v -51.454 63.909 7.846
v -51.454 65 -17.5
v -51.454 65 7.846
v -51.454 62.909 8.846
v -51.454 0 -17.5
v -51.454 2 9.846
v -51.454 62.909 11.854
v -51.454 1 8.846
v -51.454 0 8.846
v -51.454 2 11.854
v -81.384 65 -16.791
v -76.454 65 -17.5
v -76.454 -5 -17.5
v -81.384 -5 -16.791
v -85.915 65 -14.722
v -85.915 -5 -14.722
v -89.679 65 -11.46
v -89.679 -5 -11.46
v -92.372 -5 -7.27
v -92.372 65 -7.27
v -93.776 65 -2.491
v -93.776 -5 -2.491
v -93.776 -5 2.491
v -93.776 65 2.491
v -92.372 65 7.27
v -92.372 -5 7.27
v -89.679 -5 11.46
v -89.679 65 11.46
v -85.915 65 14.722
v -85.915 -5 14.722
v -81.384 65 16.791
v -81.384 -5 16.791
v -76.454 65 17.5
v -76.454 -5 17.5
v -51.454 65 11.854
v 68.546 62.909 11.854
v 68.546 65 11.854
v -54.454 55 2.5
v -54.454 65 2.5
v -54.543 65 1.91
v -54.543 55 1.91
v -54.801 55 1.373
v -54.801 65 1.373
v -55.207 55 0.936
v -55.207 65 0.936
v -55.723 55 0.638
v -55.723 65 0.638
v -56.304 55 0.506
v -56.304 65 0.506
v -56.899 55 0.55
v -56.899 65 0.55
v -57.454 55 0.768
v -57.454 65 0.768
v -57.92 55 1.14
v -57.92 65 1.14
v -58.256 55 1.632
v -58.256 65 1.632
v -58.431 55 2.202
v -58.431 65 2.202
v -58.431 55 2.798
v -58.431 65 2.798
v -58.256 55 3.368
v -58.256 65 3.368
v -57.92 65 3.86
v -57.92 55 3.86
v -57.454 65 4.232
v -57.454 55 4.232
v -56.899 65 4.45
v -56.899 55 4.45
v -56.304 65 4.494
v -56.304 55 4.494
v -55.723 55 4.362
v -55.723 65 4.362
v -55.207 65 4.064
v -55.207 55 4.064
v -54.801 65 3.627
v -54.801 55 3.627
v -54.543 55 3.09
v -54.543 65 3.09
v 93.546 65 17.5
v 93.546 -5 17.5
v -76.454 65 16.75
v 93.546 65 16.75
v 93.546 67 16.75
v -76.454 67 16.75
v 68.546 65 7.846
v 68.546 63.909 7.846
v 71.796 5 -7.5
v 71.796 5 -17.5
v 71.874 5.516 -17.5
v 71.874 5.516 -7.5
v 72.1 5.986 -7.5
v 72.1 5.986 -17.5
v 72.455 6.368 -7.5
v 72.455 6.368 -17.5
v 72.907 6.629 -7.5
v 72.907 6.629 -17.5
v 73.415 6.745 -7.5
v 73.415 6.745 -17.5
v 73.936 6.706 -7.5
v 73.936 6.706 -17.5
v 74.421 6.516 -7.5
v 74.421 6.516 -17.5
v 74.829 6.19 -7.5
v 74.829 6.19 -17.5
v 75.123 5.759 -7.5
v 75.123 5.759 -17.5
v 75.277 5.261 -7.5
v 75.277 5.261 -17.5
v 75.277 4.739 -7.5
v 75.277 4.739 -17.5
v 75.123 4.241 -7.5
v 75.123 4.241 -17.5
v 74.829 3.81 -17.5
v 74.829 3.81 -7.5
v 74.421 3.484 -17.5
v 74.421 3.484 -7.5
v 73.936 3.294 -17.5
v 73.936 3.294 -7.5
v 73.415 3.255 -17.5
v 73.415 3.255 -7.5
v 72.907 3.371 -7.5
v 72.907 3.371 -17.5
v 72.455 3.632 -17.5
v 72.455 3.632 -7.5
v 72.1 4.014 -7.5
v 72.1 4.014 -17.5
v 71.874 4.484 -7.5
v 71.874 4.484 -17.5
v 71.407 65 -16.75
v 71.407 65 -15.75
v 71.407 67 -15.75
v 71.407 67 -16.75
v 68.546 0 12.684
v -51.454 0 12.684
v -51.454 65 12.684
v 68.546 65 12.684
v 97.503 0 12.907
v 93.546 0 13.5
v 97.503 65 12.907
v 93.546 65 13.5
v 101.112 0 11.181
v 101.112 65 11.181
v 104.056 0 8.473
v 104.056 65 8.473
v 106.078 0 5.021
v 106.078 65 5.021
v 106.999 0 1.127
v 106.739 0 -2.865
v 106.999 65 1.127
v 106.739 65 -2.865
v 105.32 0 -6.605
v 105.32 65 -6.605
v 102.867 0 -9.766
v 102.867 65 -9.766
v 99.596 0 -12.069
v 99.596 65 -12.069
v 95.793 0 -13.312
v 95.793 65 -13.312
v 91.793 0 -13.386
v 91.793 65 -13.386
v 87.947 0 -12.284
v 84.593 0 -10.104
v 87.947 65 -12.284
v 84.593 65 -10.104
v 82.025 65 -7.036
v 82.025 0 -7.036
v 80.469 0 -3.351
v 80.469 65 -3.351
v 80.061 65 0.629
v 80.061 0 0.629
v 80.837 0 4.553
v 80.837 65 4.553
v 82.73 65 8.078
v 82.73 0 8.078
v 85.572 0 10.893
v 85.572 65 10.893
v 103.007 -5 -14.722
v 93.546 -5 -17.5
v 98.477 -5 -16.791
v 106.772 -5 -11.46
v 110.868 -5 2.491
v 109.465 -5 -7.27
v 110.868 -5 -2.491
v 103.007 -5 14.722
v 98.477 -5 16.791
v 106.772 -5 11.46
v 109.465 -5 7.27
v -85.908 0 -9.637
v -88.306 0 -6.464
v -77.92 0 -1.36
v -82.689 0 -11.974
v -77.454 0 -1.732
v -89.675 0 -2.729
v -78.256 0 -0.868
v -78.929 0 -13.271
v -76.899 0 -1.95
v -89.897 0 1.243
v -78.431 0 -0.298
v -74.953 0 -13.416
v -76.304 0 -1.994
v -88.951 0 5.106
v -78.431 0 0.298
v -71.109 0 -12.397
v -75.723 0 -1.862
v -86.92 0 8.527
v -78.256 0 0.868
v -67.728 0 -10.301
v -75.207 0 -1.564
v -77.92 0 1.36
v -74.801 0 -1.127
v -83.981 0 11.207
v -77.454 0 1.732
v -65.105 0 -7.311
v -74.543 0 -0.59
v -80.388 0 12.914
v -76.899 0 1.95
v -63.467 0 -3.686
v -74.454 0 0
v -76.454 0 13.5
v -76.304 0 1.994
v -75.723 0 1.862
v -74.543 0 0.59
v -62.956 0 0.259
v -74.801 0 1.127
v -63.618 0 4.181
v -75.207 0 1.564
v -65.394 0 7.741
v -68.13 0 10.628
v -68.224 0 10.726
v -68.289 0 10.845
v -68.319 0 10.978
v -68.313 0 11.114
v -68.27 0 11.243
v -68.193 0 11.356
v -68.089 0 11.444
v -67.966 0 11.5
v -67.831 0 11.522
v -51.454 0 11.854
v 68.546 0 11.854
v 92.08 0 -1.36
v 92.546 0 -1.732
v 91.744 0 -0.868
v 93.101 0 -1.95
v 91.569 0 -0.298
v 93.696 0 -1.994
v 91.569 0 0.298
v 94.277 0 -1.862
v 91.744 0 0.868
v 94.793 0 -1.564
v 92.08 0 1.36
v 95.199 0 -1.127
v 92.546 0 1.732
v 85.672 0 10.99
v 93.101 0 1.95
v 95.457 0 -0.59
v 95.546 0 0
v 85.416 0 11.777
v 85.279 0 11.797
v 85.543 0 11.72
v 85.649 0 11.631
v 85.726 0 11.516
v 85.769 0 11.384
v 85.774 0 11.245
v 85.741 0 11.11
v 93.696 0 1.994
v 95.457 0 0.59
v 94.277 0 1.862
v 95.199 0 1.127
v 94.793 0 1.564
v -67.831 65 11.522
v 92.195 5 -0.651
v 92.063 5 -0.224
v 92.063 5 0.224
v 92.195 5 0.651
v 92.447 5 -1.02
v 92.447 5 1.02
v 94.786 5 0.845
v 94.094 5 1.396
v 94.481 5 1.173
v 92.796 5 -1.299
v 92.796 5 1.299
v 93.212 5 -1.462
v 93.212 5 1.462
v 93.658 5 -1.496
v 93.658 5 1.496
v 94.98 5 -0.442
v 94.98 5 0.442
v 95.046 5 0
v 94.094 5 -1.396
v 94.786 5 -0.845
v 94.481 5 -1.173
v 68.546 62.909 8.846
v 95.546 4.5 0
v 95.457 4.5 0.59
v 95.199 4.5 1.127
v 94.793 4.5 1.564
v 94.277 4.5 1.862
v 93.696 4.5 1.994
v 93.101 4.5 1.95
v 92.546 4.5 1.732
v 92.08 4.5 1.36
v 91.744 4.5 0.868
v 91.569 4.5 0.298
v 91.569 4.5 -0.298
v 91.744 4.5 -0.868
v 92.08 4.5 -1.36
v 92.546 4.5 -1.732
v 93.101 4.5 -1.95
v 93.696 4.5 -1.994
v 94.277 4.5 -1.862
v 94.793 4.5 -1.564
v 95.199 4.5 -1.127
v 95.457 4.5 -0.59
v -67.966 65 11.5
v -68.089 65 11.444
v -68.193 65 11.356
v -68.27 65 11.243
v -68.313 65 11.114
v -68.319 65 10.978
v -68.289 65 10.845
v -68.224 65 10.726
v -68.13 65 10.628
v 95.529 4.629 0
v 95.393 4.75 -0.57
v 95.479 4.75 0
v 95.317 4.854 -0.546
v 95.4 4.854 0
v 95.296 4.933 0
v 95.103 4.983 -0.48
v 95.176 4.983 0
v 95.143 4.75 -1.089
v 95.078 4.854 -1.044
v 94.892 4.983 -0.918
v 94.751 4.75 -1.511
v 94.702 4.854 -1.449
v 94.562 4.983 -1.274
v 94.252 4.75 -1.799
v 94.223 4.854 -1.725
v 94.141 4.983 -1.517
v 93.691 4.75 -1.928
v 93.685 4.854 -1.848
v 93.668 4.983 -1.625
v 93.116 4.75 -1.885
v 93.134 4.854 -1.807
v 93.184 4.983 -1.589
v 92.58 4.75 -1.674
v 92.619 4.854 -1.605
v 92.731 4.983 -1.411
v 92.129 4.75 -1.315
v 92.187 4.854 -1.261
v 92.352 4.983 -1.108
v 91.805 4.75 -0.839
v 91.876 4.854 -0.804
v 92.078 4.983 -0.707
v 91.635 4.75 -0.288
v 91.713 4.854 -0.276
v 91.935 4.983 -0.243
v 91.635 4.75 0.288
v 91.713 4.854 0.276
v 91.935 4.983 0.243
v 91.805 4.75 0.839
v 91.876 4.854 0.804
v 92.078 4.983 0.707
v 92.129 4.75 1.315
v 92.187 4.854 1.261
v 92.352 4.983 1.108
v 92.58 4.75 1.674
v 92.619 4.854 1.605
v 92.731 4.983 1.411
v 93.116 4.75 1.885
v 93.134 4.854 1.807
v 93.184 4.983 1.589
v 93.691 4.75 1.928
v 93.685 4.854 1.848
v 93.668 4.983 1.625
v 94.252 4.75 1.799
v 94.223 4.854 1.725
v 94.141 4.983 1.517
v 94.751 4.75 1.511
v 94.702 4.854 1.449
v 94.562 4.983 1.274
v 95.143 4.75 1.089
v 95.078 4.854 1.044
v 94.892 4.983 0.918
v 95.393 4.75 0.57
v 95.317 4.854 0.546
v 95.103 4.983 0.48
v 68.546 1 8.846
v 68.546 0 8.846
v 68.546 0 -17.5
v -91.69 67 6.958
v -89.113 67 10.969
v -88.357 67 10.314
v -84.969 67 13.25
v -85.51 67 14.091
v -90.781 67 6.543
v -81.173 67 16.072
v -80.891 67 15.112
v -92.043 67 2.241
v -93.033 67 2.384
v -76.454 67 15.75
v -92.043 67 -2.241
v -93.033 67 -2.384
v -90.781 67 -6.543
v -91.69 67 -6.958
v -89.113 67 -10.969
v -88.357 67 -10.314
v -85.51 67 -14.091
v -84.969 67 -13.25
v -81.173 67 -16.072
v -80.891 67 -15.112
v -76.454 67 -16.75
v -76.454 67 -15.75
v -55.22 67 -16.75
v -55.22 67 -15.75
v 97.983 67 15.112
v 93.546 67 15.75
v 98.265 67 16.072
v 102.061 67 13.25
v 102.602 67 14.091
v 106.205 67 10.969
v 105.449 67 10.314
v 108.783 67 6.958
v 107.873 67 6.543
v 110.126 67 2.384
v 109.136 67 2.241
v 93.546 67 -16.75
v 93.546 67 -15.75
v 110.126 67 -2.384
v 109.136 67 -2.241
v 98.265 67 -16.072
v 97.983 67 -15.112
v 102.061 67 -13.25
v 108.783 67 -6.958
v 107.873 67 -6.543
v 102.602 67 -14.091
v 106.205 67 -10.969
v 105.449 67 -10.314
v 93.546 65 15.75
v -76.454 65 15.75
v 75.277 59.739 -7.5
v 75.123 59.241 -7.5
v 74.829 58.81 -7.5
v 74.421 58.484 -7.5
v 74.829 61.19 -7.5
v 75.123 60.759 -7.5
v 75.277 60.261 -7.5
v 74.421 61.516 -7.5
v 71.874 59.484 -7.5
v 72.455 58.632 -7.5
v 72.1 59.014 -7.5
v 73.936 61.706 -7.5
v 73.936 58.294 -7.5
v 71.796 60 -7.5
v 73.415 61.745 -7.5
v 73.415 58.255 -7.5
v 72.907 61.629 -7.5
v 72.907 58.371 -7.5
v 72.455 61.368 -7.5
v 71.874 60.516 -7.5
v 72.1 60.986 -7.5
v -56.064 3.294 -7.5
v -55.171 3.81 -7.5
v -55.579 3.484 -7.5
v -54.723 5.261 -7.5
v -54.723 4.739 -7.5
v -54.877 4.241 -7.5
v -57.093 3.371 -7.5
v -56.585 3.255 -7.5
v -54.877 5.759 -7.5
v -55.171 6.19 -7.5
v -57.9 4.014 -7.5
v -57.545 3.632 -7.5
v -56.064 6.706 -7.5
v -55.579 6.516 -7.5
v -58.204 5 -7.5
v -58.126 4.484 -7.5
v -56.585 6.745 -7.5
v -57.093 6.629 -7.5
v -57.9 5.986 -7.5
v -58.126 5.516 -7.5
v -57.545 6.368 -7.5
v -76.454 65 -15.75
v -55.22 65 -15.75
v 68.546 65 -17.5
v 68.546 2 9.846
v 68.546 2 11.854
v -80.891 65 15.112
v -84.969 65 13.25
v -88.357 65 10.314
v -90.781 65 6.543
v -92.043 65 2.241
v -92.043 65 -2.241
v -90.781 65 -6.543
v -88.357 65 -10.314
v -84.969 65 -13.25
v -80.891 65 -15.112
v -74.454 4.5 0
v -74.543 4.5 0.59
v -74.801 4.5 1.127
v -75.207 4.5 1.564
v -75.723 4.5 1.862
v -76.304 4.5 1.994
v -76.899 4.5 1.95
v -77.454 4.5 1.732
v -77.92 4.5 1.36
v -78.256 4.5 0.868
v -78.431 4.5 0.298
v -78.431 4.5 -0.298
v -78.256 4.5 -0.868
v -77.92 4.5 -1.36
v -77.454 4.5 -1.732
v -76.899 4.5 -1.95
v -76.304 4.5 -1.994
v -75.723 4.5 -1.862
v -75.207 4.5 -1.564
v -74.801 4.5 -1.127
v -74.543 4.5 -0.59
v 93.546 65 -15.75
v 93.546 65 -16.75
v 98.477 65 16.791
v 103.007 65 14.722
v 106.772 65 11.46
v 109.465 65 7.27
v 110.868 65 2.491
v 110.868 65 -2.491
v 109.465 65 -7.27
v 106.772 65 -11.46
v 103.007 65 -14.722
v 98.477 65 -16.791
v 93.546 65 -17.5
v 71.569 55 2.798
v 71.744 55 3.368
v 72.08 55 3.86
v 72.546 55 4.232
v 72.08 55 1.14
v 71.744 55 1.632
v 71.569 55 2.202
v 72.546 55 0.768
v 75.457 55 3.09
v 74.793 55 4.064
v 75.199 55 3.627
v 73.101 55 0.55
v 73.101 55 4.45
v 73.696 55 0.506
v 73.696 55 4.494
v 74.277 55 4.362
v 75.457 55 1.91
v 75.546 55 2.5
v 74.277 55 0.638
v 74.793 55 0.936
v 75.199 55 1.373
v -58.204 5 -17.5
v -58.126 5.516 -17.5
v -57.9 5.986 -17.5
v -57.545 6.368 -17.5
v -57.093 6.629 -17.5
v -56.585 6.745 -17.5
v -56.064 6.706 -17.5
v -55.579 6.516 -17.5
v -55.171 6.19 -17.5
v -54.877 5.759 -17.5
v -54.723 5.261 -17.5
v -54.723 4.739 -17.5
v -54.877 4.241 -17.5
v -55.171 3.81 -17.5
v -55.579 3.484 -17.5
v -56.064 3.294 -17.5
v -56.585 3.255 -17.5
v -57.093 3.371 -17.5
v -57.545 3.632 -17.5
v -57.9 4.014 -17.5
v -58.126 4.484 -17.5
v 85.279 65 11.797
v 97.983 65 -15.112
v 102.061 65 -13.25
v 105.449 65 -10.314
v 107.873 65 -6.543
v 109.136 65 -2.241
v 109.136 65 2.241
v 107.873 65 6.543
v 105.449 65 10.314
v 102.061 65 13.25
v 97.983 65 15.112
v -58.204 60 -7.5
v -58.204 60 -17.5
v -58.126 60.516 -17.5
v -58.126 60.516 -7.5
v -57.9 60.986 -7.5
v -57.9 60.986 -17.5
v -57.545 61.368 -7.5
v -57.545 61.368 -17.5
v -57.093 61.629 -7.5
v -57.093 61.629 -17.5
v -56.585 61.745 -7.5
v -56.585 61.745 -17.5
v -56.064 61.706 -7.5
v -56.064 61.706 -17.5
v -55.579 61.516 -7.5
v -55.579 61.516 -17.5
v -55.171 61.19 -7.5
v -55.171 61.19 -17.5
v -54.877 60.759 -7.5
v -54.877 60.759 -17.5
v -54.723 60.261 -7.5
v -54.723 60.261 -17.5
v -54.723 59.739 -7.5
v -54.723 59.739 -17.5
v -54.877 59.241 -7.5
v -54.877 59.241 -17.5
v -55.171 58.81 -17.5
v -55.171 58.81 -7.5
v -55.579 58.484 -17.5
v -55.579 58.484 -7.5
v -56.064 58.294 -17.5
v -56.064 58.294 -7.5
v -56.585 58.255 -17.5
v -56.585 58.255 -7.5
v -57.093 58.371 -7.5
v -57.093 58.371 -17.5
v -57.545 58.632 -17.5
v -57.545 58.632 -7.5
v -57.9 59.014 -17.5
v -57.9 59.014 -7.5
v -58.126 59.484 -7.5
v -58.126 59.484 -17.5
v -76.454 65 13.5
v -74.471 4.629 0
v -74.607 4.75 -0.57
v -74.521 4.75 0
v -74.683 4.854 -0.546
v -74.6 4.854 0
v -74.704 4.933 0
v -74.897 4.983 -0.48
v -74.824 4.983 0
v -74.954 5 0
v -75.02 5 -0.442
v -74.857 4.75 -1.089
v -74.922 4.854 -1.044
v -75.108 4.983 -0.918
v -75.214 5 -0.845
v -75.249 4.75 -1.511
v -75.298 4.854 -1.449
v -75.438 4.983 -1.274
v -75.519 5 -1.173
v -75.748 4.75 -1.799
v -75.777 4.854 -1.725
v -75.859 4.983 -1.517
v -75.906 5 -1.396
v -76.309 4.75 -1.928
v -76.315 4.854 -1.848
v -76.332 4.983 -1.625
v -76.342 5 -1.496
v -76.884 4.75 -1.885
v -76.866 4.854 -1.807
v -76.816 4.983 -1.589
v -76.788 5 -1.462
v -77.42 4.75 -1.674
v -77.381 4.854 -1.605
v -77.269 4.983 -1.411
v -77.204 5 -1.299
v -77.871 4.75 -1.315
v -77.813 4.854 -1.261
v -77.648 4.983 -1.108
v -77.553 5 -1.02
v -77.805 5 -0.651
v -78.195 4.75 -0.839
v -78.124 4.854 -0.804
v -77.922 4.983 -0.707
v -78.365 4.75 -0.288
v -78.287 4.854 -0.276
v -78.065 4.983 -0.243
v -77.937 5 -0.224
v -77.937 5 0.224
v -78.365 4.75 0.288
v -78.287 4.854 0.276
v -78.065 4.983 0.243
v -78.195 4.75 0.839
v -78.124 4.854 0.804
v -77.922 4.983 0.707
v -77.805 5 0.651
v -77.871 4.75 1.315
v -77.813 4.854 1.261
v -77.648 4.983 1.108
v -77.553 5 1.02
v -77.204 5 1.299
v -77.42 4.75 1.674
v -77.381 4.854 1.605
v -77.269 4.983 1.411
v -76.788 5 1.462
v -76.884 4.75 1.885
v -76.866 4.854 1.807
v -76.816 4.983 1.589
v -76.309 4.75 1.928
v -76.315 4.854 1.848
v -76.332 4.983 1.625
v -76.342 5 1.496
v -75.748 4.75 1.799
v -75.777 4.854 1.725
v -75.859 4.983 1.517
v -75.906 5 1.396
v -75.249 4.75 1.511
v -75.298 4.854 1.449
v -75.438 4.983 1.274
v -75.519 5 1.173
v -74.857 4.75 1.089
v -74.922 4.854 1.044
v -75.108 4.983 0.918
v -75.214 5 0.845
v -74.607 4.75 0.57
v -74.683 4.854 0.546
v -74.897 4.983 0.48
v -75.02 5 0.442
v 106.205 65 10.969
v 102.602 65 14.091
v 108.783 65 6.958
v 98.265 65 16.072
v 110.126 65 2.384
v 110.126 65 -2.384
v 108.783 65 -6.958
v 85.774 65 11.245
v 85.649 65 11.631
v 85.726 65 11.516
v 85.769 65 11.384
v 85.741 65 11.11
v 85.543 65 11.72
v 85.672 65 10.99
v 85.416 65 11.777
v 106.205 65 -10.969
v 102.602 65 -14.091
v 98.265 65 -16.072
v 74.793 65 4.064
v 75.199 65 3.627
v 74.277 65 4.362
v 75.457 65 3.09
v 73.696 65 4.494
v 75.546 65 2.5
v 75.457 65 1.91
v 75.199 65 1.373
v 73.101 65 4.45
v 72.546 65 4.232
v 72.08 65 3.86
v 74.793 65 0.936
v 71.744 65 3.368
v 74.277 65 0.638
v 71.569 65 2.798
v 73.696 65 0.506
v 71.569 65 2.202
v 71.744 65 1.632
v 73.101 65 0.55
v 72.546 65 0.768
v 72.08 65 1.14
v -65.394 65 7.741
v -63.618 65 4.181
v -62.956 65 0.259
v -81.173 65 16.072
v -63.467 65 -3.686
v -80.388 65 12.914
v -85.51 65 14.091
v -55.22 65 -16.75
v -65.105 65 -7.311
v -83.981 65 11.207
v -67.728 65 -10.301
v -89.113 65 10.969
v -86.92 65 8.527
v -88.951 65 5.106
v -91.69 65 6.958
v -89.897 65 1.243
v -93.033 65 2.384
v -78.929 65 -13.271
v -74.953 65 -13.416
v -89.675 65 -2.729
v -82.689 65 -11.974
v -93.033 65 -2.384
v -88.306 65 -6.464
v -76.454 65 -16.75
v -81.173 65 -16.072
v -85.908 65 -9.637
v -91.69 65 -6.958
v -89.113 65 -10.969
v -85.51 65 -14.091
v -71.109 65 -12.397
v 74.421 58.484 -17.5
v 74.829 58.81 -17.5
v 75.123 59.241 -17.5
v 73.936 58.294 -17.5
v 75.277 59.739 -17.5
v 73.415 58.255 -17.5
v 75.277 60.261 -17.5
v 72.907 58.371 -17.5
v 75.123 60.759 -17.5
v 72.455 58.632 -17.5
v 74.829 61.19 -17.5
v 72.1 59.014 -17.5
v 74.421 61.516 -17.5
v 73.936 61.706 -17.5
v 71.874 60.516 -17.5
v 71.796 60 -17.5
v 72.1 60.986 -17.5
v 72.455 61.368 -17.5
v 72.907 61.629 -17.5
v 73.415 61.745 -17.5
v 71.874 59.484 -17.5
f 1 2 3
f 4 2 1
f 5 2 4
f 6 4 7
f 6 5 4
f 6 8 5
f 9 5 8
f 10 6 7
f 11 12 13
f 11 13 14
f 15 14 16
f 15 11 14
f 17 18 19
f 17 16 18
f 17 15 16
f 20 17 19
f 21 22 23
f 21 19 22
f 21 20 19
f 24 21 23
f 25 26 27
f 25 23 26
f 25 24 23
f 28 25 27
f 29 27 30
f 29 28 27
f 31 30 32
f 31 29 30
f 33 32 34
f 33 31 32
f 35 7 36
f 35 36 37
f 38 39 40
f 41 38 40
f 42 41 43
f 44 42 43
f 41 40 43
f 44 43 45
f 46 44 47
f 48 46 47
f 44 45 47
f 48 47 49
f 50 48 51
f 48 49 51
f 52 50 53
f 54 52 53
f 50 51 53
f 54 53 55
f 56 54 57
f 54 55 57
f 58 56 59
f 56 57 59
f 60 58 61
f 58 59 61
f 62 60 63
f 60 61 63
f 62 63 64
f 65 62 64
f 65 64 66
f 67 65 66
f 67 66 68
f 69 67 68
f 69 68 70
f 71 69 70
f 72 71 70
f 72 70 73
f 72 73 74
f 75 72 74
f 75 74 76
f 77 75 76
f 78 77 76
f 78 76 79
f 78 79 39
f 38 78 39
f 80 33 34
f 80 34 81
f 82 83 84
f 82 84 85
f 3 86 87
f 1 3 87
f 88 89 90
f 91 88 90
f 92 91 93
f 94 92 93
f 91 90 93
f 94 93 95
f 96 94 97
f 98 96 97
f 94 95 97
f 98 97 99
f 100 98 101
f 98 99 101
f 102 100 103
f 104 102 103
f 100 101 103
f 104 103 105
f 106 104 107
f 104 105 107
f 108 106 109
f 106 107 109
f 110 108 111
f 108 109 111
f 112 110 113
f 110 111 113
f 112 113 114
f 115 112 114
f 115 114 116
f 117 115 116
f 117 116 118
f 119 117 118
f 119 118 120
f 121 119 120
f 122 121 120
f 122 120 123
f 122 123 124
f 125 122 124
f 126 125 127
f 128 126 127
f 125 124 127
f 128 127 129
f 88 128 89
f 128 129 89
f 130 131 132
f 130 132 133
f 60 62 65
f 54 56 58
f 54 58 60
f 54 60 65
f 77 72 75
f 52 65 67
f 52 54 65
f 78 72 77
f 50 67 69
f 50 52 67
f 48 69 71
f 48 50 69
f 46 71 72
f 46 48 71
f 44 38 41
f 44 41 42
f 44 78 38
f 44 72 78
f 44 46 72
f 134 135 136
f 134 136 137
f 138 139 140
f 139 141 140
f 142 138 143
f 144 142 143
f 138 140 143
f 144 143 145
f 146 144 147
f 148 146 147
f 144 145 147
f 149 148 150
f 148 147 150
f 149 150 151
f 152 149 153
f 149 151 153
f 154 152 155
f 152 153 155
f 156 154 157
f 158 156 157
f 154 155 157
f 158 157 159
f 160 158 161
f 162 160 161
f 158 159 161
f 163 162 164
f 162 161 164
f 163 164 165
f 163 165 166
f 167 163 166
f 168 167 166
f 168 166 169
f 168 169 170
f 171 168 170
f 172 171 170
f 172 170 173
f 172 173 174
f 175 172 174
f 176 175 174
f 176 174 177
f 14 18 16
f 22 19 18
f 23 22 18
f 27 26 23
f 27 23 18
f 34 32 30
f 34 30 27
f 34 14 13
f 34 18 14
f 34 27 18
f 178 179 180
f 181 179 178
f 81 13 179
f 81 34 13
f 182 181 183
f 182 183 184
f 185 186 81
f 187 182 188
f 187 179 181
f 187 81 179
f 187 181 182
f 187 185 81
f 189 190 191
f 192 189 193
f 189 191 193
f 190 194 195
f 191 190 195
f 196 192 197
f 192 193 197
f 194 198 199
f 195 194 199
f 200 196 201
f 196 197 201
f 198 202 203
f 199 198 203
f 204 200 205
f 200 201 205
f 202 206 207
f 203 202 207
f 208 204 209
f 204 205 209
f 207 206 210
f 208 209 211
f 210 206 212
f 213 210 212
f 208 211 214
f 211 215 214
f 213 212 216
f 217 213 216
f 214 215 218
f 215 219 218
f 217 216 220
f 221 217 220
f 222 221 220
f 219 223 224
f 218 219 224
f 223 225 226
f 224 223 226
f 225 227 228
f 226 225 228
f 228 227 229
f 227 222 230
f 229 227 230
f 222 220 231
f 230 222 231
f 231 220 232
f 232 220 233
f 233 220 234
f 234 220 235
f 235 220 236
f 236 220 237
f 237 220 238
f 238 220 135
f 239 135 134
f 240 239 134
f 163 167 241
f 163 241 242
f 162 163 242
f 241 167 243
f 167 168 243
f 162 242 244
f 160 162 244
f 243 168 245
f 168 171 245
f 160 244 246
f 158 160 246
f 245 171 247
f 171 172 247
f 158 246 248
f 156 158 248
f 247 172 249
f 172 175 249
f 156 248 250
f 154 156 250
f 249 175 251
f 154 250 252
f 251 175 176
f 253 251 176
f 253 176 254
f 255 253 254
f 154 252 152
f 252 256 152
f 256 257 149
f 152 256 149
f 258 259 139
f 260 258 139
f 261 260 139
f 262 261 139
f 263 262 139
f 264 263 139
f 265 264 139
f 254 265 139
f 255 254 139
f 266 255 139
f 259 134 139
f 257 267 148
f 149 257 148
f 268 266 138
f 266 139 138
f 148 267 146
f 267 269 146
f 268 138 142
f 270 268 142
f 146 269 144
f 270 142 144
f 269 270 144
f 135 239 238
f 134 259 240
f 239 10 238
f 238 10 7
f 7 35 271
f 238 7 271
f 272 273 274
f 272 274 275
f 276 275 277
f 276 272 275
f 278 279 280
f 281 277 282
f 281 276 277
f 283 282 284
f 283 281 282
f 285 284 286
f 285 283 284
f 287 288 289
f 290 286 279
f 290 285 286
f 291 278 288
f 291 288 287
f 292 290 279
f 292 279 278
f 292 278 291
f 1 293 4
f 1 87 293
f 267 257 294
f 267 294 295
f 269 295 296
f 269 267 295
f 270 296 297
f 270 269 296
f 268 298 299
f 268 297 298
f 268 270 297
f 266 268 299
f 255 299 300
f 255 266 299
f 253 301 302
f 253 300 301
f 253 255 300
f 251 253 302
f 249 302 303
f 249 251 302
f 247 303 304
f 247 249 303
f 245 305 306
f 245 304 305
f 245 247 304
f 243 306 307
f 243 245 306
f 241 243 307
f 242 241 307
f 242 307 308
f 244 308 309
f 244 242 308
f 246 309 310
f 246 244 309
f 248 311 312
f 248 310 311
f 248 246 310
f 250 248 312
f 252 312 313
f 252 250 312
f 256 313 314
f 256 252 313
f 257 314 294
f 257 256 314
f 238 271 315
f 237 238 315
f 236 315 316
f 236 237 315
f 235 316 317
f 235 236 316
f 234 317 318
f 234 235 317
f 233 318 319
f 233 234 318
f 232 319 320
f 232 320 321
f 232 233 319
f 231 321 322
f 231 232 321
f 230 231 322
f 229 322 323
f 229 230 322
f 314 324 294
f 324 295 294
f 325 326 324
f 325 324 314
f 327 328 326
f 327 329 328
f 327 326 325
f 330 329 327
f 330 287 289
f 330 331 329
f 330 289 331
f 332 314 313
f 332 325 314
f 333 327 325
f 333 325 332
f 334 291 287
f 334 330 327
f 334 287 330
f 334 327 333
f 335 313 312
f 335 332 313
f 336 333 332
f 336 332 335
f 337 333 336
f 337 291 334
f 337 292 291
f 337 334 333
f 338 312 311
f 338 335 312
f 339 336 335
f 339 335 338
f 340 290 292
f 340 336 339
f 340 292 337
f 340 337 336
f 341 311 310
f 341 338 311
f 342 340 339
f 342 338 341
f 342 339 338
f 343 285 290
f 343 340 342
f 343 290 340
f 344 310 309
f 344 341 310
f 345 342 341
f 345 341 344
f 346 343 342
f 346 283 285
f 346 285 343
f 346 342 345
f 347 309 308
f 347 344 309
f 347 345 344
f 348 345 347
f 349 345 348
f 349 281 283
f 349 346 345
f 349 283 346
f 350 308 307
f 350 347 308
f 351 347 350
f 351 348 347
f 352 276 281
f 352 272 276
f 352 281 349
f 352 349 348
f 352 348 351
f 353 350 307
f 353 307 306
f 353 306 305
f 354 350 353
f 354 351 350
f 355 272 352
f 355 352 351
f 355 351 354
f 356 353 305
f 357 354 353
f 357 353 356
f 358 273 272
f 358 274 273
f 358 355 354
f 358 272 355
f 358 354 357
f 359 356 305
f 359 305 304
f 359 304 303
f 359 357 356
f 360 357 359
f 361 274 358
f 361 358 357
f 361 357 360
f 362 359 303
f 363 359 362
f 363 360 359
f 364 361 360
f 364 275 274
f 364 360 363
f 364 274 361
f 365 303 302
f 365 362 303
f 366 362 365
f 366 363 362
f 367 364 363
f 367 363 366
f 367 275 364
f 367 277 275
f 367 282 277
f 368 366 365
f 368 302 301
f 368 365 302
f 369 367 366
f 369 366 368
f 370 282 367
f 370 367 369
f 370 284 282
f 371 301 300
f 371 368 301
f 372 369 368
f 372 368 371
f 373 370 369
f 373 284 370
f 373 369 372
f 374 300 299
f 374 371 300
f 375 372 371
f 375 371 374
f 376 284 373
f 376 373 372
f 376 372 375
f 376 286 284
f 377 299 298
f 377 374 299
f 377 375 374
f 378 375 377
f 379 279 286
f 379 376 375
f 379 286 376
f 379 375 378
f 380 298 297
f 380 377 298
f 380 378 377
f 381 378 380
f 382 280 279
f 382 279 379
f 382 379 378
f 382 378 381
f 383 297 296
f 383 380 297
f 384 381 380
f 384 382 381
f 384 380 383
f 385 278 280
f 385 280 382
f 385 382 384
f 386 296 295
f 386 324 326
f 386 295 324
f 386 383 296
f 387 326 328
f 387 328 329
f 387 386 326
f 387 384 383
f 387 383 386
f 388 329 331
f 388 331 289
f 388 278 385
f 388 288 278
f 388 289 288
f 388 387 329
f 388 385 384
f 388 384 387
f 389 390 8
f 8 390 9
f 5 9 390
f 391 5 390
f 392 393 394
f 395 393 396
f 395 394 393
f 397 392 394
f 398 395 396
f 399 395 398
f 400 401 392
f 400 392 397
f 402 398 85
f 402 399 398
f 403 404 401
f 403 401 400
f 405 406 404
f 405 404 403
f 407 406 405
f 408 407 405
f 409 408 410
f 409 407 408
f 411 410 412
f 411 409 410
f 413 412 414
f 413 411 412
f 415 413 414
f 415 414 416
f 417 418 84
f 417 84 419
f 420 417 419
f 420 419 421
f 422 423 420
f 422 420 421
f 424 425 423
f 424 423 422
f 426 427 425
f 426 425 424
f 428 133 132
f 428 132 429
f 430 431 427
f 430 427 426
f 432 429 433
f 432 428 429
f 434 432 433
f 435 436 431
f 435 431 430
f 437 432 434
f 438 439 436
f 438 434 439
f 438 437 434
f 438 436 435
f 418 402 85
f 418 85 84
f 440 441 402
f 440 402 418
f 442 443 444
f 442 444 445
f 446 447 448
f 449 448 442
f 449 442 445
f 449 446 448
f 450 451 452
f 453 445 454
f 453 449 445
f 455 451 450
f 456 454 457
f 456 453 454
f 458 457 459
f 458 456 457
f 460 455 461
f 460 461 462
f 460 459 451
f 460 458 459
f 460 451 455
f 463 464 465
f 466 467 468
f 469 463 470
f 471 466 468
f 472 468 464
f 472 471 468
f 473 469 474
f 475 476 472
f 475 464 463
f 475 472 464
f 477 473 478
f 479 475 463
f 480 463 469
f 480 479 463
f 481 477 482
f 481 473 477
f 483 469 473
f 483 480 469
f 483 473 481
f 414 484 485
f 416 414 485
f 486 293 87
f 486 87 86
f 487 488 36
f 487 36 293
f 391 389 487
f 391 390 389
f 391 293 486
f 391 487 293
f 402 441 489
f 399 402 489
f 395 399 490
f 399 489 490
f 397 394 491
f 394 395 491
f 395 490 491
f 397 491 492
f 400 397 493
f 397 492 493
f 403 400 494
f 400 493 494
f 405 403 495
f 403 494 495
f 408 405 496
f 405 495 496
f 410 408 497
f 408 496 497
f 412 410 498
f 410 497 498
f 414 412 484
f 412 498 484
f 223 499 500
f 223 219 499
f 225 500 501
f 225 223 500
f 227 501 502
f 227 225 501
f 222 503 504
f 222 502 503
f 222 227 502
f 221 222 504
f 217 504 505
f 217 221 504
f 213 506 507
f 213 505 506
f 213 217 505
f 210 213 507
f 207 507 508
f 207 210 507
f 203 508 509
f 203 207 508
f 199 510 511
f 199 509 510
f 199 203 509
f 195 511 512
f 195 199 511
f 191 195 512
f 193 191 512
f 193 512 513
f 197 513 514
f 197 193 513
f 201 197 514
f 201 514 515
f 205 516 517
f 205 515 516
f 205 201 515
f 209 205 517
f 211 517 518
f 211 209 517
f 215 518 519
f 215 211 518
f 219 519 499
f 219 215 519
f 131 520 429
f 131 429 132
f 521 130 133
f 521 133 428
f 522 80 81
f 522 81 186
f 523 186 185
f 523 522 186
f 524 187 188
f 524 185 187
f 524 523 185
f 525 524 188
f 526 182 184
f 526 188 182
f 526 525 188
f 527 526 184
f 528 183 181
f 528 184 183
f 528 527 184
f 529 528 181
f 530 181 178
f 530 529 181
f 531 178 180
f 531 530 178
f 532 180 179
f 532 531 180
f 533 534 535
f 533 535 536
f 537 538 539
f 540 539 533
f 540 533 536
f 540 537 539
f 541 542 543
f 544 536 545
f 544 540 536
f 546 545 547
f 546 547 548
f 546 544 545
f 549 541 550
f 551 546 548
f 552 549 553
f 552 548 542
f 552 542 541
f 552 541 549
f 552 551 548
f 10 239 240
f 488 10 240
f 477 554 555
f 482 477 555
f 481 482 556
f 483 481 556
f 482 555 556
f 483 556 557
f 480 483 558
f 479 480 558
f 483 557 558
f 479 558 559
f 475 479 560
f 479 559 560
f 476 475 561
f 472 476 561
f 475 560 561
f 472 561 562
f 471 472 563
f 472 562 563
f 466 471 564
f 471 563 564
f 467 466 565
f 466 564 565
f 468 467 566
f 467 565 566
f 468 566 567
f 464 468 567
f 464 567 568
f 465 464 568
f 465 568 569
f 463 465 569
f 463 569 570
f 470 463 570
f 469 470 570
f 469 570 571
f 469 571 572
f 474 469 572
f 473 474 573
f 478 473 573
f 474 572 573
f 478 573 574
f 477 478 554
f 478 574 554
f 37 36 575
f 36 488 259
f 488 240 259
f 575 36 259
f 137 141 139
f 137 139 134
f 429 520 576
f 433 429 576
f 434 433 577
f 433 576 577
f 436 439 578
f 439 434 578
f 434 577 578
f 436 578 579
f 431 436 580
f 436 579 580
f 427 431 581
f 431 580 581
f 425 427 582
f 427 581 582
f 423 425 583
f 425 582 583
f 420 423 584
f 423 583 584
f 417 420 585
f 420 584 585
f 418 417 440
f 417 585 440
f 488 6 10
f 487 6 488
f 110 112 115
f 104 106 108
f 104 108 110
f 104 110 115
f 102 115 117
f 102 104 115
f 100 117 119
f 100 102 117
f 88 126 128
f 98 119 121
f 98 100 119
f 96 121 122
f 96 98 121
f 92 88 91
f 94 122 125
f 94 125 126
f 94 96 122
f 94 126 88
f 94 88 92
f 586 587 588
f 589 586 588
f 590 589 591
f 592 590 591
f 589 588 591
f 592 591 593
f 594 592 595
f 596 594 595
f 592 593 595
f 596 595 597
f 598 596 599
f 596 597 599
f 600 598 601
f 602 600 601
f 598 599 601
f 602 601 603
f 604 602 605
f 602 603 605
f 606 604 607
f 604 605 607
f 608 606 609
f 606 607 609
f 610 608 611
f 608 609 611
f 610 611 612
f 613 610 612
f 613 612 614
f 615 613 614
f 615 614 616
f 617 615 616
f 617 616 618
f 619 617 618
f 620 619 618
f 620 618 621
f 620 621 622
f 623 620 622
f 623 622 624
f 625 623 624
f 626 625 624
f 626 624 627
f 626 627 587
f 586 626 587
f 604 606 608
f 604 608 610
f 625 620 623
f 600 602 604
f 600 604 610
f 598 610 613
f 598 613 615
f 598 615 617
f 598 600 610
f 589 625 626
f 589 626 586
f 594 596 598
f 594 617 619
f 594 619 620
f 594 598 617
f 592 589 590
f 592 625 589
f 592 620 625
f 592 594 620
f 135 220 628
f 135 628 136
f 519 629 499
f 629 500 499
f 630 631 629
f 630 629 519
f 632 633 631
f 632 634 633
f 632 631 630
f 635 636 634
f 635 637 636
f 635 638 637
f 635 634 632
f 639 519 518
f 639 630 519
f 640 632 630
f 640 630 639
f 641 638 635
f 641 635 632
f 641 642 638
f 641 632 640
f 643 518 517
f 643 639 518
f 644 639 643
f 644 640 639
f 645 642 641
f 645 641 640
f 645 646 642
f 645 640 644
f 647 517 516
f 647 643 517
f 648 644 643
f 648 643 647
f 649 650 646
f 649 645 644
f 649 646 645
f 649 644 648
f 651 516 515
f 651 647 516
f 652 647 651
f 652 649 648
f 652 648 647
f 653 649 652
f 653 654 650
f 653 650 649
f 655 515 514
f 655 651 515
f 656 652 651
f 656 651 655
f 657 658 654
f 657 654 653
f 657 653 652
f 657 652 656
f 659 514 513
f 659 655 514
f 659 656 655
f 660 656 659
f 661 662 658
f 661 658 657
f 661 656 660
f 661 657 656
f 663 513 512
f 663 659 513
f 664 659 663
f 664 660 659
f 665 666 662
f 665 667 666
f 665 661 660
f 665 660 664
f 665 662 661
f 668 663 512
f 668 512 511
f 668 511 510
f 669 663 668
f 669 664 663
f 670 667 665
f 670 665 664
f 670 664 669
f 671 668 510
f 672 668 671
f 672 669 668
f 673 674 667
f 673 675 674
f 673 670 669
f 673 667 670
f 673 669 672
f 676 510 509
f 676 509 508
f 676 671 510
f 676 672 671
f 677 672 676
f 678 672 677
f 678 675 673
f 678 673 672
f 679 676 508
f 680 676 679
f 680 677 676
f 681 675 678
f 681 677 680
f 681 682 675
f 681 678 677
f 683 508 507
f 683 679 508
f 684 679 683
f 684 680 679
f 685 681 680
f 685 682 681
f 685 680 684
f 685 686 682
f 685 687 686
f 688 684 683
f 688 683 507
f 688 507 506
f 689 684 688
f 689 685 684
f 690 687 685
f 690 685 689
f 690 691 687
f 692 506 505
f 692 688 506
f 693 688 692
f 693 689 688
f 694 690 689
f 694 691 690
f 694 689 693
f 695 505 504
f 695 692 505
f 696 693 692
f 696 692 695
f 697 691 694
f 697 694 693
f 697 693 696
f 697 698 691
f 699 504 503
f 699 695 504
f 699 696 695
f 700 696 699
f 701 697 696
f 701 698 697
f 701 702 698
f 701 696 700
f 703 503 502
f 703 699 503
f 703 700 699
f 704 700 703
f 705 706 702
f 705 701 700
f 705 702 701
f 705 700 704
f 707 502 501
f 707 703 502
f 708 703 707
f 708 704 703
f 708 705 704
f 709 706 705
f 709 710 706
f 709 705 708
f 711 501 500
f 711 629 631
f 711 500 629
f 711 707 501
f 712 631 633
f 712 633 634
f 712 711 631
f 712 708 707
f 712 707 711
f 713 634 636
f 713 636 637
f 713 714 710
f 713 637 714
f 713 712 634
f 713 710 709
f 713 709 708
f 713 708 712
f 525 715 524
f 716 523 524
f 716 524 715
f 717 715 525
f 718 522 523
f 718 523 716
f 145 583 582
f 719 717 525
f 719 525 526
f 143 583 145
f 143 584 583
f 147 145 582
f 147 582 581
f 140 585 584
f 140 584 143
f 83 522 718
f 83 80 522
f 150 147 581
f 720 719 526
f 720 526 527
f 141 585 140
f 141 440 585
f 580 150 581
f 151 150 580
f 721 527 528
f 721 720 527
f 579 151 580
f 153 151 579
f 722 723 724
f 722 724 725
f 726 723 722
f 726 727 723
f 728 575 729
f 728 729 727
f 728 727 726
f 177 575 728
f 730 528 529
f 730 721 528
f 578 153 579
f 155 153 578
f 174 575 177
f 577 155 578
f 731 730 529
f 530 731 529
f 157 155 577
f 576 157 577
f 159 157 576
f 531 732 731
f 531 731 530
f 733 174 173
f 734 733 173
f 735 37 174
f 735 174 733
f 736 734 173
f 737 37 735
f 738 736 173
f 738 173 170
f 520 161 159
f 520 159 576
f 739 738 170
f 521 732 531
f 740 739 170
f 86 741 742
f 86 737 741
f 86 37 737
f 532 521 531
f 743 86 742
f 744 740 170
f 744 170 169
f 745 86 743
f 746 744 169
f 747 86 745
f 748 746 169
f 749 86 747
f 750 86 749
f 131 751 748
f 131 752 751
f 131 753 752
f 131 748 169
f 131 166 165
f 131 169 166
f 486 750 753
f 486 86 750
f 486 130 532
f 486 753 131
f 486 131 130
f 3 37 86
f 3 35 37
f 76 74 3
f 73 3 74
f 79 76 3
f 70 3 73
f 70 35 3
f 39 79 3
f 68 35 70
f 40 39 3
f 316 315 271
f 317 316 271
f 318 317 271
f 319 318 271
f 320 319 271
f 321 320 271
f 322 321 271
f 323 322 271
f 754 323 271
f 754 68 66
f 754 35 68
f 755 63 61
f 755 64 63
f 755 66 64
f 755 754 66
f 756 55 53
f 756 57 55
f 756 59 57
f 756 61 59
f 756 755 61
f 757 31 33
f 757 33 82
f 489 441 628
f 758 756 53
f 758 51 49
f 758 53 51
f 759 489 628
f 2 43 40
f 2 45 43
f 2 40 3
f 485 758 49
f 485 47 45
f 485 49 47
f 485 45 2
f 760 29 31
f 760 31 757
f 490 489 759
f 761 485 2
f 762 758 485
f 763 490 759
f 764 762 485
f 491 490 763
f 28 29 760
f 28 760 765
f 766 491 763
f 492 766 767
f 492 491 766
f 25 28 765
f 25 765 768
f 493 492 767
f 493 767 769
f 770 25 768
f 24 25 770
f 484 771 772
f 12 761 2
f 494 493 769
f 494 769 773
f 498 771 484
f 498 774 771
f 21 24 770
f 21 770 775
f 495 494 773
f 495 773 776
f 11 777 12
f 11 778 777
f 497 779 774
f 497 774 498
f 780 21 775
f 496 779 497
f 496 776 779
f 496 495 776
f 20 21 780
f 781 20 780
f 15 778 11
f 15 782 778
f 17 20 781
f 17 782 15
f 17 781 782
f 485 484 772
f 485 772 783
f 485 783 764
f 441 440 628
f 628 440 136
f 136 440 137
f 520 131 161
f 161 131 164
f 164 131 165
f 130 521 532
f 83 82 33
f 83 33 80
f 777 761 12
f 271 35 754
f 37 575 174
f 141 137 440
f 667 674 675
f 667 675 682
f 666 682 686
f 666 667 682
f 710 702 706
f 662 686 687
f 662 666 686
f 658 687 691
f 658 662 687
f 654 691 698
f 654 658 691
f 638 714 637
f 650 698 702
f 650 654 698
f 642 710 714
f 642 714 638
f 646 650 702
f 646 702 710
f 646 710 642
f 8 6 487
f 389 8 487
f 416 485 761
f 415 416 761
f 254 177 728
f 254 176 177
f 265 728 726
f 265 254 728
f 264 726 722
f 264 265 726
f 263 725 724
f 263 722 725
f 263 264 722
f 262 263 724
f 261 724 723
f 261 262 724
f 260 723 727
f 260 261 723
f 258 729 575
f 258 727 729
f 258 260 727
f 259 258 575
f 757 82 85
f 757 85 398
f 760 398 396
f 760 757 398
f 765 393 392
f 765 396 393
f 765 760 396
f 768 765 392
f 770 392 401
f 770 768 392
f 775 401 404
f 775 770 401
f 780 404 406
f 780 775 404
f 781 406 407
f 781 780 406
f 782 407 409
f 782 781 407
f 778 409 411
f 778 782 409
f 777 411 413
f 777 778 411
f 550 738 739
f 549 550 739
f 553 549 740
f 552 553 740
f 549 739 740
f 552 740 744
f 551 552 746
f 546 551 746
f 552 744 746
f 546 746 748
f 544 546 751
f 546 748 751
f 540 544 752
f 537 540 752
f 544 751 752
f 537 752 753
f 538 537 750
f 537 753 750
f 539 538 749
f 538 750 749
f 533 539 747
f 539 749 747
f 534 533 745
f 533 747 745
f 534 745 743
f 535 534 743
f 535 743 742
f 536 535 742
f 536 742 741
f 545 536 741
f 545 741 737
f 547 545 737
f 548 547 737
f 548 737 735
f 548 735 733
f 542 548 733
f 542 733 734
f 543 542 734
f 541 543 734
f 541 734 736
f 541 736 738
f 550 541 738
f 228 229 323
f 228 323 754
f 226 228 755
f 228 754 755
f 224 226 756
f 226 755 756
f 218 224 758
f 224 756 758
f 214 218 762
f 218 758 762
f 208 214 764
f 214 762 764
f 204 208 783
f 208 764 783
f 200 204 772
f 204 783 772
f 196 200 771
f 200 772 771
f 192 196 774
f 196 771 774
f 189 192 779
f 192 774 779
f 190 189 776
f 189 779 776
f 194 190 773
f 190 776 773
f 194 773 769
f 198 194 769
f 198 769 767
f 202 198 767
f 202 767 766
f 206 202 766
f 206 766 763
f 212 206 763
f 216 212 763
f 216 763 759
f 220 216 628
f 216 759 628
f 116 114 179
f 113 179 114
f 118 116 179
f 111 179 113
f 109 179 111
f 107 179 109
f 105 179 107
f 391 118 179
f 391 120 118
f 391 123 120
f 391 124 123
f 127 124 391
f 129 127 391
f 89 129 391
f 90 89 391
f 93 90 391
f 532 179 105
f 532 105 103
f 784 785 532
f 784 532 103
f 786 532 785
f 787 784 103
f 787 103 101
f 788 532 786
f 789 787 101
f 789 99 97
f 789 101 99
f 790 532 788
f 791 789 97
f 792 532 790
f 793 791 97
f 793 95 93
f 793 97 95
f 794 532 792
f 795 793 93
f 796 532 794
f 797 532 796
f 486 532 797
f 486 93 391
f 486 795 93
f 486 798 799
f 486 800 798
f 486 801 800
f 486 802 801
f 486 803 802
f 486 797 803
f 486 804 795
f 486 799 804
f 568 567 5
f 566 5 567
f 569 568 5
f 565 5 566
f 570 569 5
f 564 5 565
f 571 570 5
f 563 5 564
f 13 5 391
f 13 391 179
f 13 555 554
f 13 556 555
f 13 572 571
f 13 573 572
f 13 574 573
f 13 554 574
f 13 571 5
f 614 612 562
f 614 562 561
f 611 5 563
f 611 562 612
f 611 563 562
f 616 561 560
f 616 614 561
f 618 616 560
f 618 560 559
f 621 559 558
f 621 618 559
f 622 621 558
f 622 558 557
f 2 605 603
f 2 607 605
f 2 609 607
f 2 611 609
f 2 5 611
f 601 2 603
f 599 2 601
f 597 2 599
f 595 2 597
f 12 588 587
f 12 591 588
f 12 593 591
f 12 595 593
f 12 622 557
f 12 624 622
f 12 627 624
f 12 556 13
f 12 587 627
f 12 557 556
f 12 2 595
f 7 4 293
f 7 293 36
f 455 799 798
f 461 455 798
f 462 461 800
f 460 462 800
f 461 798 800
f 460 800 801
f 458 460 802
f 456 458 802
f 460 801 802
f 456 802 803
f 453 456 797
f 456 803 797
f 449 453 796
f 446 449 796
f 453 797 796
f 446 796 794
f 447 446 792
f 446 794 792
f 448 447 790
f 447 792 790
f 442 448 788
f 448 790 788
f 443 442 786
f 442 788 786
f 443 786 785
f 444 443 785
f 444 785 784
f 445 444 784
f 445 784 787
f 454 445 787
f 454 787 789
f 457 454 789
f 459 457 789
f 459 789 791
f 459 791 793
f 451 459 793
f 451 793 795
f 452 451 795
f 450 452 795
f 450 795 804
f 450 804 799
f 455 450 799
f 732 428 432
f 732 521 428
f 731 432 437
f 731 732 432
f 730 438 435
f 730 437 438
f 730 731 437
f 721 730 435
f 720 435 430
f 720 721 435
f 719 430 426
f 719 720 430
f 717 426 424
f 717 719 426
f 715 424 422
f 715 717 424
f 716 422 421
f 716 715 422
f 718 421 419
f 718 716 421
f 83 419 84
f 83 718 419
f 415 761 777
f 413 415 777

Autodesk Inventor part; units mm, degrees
ref_plane "YZ Plane" through (0, 0, 0) normal (1, 0, 0) x (0, 1, 0)
ref_plane "XZ Plane" through (0, 0, 0) normal (0, 1, 0) x (-1, 0, 0)
ref_plane "XY Plane" through (0, 0, 0) normal (0, 0, 1) x (1, 0, 0)
sketch "Sketch1" plane through (0, 0, 0) normal (0, 1, 0) x (-1, 0, 0)
  arc A0 (-93.5462, 17.5) -> (-93.5462, -17.5) centre (-93.5462, 0) ccw
  arc A1 (-93.5462, 17.5) -> (-93.5462, -17.5) centre (-93.5462, 0) ccw
  line L0 (-68.5462, -17.5) -> (51.4538, -17.5)
  line L1 (51.4538, -17.5) -> (51.4538, 12.6842)
  line L2 (51.4538, 12.6842) -> (-68.5462, 12.6842)
  line L3 (-68.5462, 12.6842) -> (-68.5462, -17.5)
  line L4 (-68.5462, -17.5) -> (-93.5462, -17.5)
  arc A2 (76.4538, -17.5) -> (76.4538, 17.5) centre (76.4538, 0) ccw
  line L5 (51.4538, -17.5) -> (76.4538, -17.5)
  line L6 (76.4538, 17.5) -> (-93.5462, 17.5)
  point P0 (0, 0)
  dimension "d0" = 35
  dimension "d1" = 120
  dimension "d2" = 25
  dimension "d3" = 35
  dimension "d4" = 25
extrude "Extrusion1" add sketch "Sketch1" along normal blind 65 contours L6 A2 L5 L1 L2 L3 L4 A0
sketch "Sketch2" plane through (0, 65, 0) normal (0, 1, 0) x (1, 0, 0)
  arc A0 (-69.3673, -11.4905) -> (-75.5737, -13.4713) centre (-76.4538, 0) ccw
  arc A1 (92.6661, -13.4713) -> (86.972, -11.7911) centre (93.5462, 0) ccw
  line L0 (-51.4538, -12.6842) -> (-51.4538, 17.5) projected
  line L1 (68.5462, 17.5) -> (68.5462, -12.6842) projected
  line L2 (93.5462, -13.5) -> (68.5462, -12.6842)
  line L3 (-76.4538, -13.5) -> (-51.4538, -12.6842)
  line L4 (68.5462, -11.1899) -> (86.972, -11.7911)
  line L5 (-51.4538, -11.8536) -> (-69.3673, -11.4905)
  line L6 (-51.4538, -11.8536) -> (-51.4267, -12.6833)
  line L7 (68.5462, -11.1899) -> (68.5462, -12.6842)
  point P0 (0, 0)
  dimension "d7" = 27
  dimension "d8" = 27
  dimension "d9" = 25
  dimension "d10" = 25
extrude "Extrusion2" cut sketch "Sketch2" against normal blind 65 contours L5 L0 L3 A0 | L2 L1 L4 A1
sketch "Sketch4" plane through (0, 0, 0) normal (0, -1, 0) x (1, 0, 0)
  arc A0 (-76.4538, 13.5) -> (-69.3673, 11.4905) centre (-76.4538, 0) ccw projected
  arc A1 (-76.4538, 17.5) -> (-76.4538, -17.5) centre (-76.4538, 0) ccw
  arc A2 (93.5462, -17.5) -> (93.5462, 17.5) centre (93.5462, 0) ccw projected
  arc A3 (93.5462, -17.5) -> (93.5462, 17.5) centre (93.5462, 0) ccw
  line L0 (-76.4538, 17.5) -> (93.5462, 17.5) projected
  line L1 (-76.4538, 17.5) -> (93.5462, 17.5)
  line L2 (-51.4538, -17.5) -> (-76.4538, -17.5) projected
  line L3 (-76.4538, -17.5) -> (93.5462, -17.5)
  point P0 (0, 0)
extrude "Extrusion4" add sketch "Sketch4" along normal blind 5
sketch "Sketch5" plane through (0, 0, 0) normal (0, 1, 0) x (1, 0, 0)
  line L0 (-69.3673, -11.4905) -> (-51.4538, -11.8536) projected
  line L1 (68.5462, 17.5) -> (68.5462, -11.1899) projected
  line L2 (-51.4538, -11.8536) -> (68.5462, -11.8536)
  line L3 (68.5462, -11.8536) -> (68.5462, -8.8458)
  line L4 (68.5462, -8.8458) -> (-51.4538, -8.8458)
  line L5 (-51.4538, -8.8458) -> (-51.4538, -11.8536)
  point P0 (0, 0)
extrude "Extrusion5" add sketch "Sketch5" along normal blind 2
sketch "Sketch6" plane through (68.5462, 0, 8.8458) normal (0, 0, -1) x (-1, 0, 0)
  point P0 (68.5462, 0)
sketch "Sketch7" plane through (0, 0, 0) normal (0, 1, 0) x (1, 0, 0)
  line L0 (68.5462, -11.8536) -> (68.5462, -11.1899) projected
  line L1 (68.5462, -11.1899) -> (86.972, -11.7911) projected
  line L2 (68.5462, -11.8536) -> (86.972, -11.7911)
  line L3 (68.5462, -8.8458) -> (68.5462, -11.1899) projected
  line L4 (86.972, -11.7911) -> (68.5462, -11.1899)
  line L5 (68.5462, -11.1899) -> (68.5266, -11.7911)
  point P0 (0, 0)
extrude "Extrusion6" add sketch "Sketch7" along normal blind 65
sketch "Sketch8" plane through (-51.4538, 65, 11.8536) normal (1, 0, 0) x (0, 0, -1)
  line L0 (0, 0) -> (29.3536, 0) projected
  line L1 (0, 0) -> (4.0071, 0)
  line L2 (4.0071, 0) -> (4.0071, -2.0911)
  line L3 (4.0071, -2.0911) -> (0, -2.0911)
  line L4 (0, -2.0911) -> (0, 0)
  point P0 (11.8536, -65)
extrude "Extrusion7" add sketch "Sketch8" along normal blind 120
fillet "Fillet1" radius 0.5 1 edges at (-69.3673, 32.5, 11.4905)
fillet "Fillet2" radius 0.5 1 edges at (86.972, 32.5, 11.7911)
chamfer "Chamfer1" distance 1 angle 45 1 edges at (8.5462, 2, 8.8458)
chamfer "Chamfer2" distance 1 angle 45 1 edges at (8.5462, 62.9089, 7.8466)
sketch "Sketch9" plane through (0, 0, 0) normal (0, 1, 0) x (1, 0, 0)
  arc A0 (93.5462, -17.5) -> (93.5462, 17.5) centre (93.5462, 0) ccw projected
  line L0 (93.5462, 17.5) -> (68.5462, 17.5) projected
  line L1 (93.5462, 17.5) -> (93.5462, 17.5)
  circle A1 centre (93.5462, 0) radius 2
  line L2 (-76.4538, 17.5) -> (93.5462, 17.5) projected
  line L3 (-76.4538, -17.5) -> (93.5462, -17.5) projected
  circle A2 centre (-76.4538, 0) radius 2
  point P0 (0, 0)
  dimension "d39" = 4
  dimension "d40" = 4
extrude "Extrusion8" add sketch "Sketch9" along normal blind 5
fillet "Fillet3" radius 0.5 2 edges at (91.5462, 5, 0) (-78.4538, 5, 0)
sketch "Sketch10" plane through (-51.4538, 65, -17.5) normal (0, 0, -1) x (-1, 0, 0)
  circle A0 centre (-125, -5) radius 1.75
  circle A1 centre (-125, -60) radius 1.75
  line L0 (25, -70) -> (-145, -70) projected
  line L1 (-120, -65) -> (-120, 0) projected
  line L2 (-145, 0) -> (-120, 0) projected
  circle A2 centre (5, -60) radius 1.75
  circle A3 centre (5, -5) radius 1.75
  line L3 (0, -65) -> (0, 0) projected
  line L4 (0, 0) -> (25, 0) projected
  point P0 (-51.4538, -65)
  dimension "d44" = 3.5
  dimension "d45" = 3.5
  dimension "d46" = 10
  dimension "d47" = 5
  dimension "d48" = 5
  dimension "d49" = 3.5
  dimension "d50" = 3.5
  dimension "d51" = 5
  dimension "d52" = 5
  dimension "d53" = 5
  dimension "d54" = 10
extrude "Extrusion9" cut sketch "Sketch10" against normal blind 10
sketch "Sketch11" plane through (0, 65, 0) normal (0, 1, 0) x (1, 0, 0)
  point P0 (0, 0)
sketch "Sketch12" plane through (0, 65, 0) normal (0, 1, 0) x (1, 0, 0)
  circle A0 centre (73.5462, -2.5) radius 2
  circle A1 centre (-56.4538, -2.5) radius 2
  line L0 (68.5462, 17.5) -> (68.5462, -7.8466) projected
  line L1 (93.5462, 17.5) -> (68.5462, 17.5) projected
  line L2 (-51.4538, -7.8466) -> (-51.4538, 17.5) projected
  arc A2 (93.5462, -17.5) -> (93.5462, 17.5) centre (93.5462, 0) ccw projected
  point P0 (0, 0)
  dimension "d57" = 4
  dimension "d58" = 4
  dimension "d59" = 5
  dimension "d60" = 20
  dimension "d61" = 5
  dimension "d62" = 20
extrude "Extrusion10" cut sketch "Sketch12" against normal blind 10
sketch "Sketch13" plane through (0, 65, 0) normal (0, 1, 0) x (1, 0, 0)
  circle A0 centre (93.5462, 0) radius 1.5 projected
  arc A1 (93.5462, -16.75) -> (93.5462, 16.75) centre (93.5462, 0) ccw
  circle A2 centre (93.5462, 0) radius 2 projected
  arc A3 (93.5462, -15.75) -> (93.5462, 15.75) centre (93.5462, 0) ccw
  circle A4 centre (-76.4538, 0) radius 1.5 projected
  arc A5 (-76.4538, 16.75) -> (-76.4538, -16.75) centre (-76.4538, 0) ccw
  arc A6 (-76.4538, 15.75) -> (-76.4538, -15.75) centre (-76.4538, 0) ccw
  line L0 (93.5462, -16.75) -> (-76.4538, -16.75)
  line L1 (-76.4538, -15.75) -> (93.5462, -15.75)
  line L2 (-76.4538, 15.75) -> (-55.2204, 15.75)
  line L3 (-55.2204, 15.75) -> (-55.2204, 16.75)
  line L4 (-55.2204, 16.75) -> (-76.4538, 16.75)
  line L5 (93.5462, 15.75) -> (71.4067, 15.75)
  line L6 (71.4067, 15.75) -> (71.4067, 16.75)
  line L7 (71.4067, 16.75) -> (93.5462, 16.75)
  point P0 (0, 0)
  dimension "d65" = 33.5
  dimension "d66" = 31.5
  dimension "d67" = 33.5
  dimension "d68" = 31.5
extrude "Extrusion11" add sketch "Sketch13" along normal blind 2 contours L0 A5 L4 L3 L2 A6 L1 A3 L5 L6 L7 A1
sketch "Sketch14" plane through (-51.4538, 65, -17.5) normal (0, 0, -1) x (-1, 0, 0)
  point P0 (-51.4538, -65)
properties part number "C-PAN"
